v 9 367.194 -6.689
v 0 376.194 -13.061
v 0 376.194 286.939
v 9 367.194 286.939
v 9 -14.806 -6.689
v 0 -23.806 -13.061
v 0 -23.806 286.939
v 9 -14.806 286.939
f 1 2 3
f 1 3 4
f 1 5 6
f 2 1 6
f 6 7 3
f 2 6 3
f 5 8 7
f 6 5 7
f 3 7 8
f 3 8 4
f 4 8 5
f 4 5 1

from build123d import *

# Parameters (mm, degrees)
F0_W     = 400
F0_H     = 300
F1_DEPTH = 9
F3_DEPTH = 300
F5_DEPTH = 400
F6_DEPTH = 30


# Not quite as in the source:
# - a feature names something its author has since deleted; it is built from what else it names


with BuildPart() as f1:
    # F0 (on Right) → F1 (new body)
    with BuildSketch(Plane.YZ):
        with Locations((176.1937195063, 136.9389362159)):
            Rectangle(F0_W, F0_H)
    extrude(amount=F1_DEPTH)

    # F2 (on face) → F3 (cut)
    with BuildSketch(Plane.XY.offset(286.9389362159)):
        Polygon((9, 376.1937195063), (0, 376.1937195063), (9, 367.1937195063), align=None)
        Polygon((9, -14.8062804937), (0, -23.8062804937), (9, -23.8062804937), align=None)
    extrude(amount=-F3_DEPTH, mode=Mode.SUBTRACT)

    # F4 (on Front) → F5 (cut)
    with BuildSketch(Plane.XZ):
        Polygon((9, -6.68870858), (0, -13.0610637841), (9, -13.0610637841), align=None)
    extrude(amount=-F5_DEPTH, mode=Mode.SUBTRACT)

    # F4 (on Front) → F6 (cut)
    with BuildSketch(Plane.XZ):
        Polygon((9, -6.68870858), (0, -13.0610637841), (9, -13.0610637841), align=None)
    extrude(amount=F6_DEPTH, mode=Mode.SUBTRACT)


solid = f1.part
